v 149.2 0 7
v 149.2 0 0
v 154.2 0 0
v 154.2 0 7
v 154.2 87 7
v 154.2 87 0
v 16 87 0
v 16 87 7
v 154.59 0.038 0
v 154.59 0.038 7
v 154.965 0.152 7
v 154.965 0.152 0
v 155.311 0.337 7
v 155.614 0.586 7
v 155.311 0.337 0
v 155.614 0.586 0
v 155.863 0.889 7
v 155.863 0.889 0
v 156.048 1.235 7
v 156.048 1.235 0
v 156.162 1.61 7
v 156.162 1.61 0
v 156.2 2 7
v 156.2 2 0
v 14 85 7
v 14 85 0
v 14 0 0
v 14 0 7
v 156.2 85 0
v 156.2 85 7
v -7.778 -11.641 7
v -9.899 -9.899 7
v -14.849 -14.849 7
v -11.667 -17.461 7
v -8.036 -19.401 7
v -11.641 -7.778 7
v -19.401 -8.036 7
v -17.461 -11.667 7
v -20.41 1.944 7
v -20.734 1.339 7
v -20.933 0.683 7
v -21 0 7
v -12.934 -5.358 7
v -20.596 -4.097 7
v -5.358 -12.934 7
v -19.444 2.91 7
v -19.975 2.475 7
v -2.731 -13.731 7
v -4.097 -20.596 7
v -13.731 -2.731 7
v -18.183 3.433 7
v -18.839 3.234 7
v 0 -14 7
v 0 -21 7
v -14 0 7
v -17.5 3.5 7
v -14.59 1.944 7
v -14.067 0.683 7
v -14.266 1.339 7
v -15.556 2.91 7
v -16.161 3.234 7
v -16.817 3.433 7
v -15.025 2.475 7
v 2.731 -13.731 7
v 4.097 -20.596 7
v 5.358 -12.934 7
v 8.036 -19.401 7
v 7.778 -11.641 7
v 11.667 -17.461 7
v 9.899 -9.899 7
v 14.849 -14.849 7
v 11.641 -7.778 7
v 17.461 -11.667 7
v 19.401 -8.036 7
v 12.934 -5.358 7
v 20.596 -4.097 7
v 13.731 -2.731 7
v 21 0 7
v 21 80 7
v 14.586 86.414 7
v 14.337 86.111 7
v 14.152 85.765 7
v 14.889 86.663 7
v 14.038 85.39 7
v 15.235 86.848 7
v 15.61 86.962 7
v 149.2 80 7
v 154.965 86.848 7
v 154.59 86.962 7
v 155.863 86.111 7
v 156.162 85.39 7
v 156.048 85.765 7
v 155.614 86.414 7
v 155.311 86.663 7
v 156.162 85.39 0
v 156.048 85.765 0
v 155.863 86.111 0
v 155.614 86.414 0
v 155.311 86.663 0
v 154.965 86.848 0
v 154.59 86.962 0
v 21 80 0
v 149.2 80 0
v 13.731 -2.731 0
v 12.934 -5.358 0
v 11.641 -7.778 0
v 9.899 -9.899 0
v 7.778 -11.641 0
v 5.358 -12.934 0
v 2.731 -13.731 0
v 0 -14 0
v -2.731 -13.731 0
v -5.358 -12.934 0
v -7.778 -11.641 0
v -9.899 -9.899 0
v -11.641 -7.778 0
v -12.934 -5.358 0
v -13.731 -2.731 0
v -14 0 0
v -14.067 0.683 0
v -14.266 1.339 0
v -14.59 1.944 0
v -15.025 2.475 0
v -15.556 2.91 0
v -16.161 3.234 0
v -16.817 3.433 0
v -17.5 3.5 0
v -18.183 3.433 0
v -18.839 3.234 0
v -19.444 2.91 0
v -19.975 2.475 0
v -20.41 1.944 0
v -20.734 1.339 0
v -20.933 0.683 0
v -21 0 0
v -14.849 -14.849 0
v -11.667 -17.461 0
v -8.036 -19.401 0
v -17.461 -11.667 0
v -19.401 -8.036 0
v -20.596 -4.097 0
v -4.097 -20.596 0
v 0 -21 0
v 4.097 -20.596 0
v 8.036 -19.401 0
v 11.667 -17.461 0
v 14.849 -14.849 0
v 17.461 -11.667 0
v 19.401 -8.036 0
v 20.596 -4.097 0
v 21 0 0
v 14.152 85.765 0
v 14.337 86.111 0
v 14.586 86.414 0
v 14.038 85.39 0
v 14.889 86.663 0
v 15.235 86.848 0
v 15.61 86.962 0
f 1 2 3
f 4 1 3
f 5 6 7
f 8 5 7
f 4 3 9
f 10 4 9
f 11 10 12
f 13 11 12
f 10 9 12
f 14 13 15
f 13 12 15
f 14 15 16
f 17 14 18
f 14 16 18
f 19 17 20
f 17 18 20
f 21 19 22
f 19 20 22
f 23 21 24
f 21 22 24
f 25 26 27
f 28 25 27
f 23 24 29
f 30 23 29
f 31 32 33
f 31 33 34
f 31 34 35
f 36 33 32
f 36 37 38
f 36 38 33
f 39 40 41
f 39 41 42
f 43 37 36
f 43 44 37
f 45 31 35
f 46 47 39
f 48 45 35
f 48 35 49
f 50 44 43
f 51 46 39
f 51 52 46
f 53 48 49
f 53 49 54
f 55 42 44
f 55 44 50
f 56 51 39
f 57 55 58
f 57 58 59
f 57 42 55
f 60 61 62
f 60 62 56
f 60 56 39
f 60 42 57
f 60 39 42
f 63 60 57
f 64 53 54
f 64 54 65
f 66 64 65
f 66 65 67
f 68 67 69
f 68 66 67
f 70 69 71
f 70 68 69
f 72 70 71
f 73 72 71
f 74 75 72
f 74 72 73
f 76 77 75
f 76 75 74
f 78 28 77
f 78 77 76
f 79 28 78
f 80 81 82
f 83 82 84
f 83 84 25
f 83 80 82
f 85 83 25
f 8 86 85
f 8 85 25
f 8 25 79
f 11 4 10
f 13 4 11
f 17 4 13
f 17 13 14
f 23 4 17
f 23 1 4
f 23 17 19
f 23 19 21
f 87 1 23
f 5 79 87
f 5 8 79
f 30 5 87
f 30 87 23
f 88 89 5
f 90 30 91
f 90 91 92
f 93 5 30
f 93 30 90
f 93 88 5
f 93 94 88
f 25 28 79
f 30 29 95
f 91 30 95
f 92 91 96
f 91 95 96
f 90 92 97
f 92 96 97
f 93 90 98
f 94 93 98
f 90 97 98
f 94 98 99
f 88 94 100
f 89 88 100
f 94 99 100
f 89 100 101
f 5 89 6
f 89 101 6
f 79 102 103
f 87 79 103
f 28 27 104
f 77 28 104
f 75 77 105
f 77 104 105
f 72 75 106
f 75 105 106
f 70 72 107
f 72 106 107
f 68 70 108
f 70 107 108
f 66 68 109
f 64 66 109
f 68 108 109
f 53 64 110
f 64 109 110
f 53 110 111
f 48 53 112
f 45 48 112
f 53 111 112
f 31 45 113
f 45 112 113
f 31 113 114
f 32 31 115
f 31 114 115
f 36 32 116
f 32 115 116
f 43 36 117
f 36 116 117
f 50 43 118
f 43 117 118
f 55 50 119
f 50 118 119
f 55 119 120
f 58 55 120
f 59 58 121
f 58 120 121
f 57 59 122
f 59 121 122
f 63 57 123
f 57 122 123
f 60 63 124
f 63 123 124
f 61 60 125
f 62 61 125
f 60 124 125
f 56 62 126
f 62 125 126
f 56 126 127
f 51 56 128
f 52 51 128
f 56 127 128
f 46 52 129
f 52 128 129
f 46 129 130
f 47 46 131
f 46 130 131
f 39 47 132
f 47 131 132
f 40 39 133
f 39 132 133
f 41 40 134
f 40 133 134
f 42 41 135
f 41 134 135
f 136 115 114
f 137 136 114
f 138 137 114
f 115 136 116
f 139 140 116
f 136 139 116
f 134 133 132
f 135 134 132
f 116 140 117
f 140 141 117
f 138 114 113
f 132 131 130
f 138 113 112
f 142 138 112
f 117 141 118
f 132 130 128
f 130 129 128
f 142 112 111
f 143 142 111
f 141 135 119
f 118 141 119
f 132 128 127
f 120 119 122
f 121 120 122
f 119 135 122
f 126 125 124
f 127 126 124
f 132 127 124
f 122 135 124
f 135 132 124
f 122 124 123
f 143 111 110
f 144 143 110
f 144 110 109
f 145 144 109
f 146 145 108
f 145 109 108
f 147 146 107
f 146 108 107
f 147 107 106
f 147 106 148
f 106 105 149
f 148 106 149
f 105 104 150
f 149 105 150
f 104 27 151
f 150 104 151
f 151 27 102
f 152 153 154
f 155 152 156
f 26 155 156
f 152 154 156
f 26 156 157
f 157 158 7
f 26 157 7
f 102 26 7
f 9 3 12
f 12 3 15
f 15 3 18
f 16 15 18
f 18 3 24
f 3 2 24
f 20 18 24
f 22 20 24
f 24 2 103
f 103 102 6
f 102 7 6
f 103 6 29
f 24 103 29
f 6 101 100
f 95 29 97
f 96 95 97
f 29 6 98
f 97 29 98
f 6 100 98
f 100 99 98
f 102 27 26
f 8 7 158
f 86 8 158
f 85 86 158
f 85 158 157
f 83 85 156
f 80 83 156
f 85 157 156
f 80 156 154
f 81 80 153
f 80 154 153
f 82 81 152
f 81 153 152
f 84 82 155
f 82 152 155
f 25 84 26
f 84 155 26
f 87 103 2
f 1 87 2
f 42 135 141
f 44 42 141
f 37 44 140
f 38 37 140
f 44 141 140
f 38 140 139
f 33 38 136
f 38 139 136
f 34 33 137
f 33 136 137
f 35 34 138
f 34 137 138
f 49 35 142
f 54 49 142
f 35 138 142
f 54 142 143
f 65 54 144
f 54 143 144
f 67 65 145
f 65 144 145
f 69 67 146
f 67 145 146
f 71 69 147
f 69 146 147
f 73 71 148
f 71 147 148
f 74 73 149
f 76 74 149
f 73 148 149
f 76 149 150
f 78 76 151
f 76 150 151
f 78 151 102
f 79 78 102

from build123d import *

# Parameters (mm, degrees)
F2_DEPTH = 7


with BuildPart() as f2:
    # F1 (on Top) → F2 (new body)
    with BuildSketch(Plane.XY):
        with BuildLine():
            ThreePointArc((14, 0), (0, -14), (-14, 0))
            ThreePointArc((-14, 0), (-17.5, 3.5), (-21, 0))
            ThreePointArc((-21, 0), (0, -21), (21, 0))
            Line((21, 0), (21, 80))
            Line((21, 80), (149.2, 80))
            Line((149.2, 80), (149.2, 0))
            Line((149.2, 0), (154.2, 0))
            ThreePointArc((154.2, 0), (155.6142135624, 0.5857864376), (156.2, 2))
            Line((156.2, 2), (156.2, 85))
            ThreePointArc((156.2, 85), (155.6142135624, 86.4142135624), (154.2, 87))
            Line((154.2, 87), (16, 87))
            ThreePointArc((16, 87), (14.5857864376, 86.4142135624), (14, 85))
            Line((14, 85), (14, 0))
        make_face()
    extrude(amount=F2_DEPTH)


solid = f2.part
